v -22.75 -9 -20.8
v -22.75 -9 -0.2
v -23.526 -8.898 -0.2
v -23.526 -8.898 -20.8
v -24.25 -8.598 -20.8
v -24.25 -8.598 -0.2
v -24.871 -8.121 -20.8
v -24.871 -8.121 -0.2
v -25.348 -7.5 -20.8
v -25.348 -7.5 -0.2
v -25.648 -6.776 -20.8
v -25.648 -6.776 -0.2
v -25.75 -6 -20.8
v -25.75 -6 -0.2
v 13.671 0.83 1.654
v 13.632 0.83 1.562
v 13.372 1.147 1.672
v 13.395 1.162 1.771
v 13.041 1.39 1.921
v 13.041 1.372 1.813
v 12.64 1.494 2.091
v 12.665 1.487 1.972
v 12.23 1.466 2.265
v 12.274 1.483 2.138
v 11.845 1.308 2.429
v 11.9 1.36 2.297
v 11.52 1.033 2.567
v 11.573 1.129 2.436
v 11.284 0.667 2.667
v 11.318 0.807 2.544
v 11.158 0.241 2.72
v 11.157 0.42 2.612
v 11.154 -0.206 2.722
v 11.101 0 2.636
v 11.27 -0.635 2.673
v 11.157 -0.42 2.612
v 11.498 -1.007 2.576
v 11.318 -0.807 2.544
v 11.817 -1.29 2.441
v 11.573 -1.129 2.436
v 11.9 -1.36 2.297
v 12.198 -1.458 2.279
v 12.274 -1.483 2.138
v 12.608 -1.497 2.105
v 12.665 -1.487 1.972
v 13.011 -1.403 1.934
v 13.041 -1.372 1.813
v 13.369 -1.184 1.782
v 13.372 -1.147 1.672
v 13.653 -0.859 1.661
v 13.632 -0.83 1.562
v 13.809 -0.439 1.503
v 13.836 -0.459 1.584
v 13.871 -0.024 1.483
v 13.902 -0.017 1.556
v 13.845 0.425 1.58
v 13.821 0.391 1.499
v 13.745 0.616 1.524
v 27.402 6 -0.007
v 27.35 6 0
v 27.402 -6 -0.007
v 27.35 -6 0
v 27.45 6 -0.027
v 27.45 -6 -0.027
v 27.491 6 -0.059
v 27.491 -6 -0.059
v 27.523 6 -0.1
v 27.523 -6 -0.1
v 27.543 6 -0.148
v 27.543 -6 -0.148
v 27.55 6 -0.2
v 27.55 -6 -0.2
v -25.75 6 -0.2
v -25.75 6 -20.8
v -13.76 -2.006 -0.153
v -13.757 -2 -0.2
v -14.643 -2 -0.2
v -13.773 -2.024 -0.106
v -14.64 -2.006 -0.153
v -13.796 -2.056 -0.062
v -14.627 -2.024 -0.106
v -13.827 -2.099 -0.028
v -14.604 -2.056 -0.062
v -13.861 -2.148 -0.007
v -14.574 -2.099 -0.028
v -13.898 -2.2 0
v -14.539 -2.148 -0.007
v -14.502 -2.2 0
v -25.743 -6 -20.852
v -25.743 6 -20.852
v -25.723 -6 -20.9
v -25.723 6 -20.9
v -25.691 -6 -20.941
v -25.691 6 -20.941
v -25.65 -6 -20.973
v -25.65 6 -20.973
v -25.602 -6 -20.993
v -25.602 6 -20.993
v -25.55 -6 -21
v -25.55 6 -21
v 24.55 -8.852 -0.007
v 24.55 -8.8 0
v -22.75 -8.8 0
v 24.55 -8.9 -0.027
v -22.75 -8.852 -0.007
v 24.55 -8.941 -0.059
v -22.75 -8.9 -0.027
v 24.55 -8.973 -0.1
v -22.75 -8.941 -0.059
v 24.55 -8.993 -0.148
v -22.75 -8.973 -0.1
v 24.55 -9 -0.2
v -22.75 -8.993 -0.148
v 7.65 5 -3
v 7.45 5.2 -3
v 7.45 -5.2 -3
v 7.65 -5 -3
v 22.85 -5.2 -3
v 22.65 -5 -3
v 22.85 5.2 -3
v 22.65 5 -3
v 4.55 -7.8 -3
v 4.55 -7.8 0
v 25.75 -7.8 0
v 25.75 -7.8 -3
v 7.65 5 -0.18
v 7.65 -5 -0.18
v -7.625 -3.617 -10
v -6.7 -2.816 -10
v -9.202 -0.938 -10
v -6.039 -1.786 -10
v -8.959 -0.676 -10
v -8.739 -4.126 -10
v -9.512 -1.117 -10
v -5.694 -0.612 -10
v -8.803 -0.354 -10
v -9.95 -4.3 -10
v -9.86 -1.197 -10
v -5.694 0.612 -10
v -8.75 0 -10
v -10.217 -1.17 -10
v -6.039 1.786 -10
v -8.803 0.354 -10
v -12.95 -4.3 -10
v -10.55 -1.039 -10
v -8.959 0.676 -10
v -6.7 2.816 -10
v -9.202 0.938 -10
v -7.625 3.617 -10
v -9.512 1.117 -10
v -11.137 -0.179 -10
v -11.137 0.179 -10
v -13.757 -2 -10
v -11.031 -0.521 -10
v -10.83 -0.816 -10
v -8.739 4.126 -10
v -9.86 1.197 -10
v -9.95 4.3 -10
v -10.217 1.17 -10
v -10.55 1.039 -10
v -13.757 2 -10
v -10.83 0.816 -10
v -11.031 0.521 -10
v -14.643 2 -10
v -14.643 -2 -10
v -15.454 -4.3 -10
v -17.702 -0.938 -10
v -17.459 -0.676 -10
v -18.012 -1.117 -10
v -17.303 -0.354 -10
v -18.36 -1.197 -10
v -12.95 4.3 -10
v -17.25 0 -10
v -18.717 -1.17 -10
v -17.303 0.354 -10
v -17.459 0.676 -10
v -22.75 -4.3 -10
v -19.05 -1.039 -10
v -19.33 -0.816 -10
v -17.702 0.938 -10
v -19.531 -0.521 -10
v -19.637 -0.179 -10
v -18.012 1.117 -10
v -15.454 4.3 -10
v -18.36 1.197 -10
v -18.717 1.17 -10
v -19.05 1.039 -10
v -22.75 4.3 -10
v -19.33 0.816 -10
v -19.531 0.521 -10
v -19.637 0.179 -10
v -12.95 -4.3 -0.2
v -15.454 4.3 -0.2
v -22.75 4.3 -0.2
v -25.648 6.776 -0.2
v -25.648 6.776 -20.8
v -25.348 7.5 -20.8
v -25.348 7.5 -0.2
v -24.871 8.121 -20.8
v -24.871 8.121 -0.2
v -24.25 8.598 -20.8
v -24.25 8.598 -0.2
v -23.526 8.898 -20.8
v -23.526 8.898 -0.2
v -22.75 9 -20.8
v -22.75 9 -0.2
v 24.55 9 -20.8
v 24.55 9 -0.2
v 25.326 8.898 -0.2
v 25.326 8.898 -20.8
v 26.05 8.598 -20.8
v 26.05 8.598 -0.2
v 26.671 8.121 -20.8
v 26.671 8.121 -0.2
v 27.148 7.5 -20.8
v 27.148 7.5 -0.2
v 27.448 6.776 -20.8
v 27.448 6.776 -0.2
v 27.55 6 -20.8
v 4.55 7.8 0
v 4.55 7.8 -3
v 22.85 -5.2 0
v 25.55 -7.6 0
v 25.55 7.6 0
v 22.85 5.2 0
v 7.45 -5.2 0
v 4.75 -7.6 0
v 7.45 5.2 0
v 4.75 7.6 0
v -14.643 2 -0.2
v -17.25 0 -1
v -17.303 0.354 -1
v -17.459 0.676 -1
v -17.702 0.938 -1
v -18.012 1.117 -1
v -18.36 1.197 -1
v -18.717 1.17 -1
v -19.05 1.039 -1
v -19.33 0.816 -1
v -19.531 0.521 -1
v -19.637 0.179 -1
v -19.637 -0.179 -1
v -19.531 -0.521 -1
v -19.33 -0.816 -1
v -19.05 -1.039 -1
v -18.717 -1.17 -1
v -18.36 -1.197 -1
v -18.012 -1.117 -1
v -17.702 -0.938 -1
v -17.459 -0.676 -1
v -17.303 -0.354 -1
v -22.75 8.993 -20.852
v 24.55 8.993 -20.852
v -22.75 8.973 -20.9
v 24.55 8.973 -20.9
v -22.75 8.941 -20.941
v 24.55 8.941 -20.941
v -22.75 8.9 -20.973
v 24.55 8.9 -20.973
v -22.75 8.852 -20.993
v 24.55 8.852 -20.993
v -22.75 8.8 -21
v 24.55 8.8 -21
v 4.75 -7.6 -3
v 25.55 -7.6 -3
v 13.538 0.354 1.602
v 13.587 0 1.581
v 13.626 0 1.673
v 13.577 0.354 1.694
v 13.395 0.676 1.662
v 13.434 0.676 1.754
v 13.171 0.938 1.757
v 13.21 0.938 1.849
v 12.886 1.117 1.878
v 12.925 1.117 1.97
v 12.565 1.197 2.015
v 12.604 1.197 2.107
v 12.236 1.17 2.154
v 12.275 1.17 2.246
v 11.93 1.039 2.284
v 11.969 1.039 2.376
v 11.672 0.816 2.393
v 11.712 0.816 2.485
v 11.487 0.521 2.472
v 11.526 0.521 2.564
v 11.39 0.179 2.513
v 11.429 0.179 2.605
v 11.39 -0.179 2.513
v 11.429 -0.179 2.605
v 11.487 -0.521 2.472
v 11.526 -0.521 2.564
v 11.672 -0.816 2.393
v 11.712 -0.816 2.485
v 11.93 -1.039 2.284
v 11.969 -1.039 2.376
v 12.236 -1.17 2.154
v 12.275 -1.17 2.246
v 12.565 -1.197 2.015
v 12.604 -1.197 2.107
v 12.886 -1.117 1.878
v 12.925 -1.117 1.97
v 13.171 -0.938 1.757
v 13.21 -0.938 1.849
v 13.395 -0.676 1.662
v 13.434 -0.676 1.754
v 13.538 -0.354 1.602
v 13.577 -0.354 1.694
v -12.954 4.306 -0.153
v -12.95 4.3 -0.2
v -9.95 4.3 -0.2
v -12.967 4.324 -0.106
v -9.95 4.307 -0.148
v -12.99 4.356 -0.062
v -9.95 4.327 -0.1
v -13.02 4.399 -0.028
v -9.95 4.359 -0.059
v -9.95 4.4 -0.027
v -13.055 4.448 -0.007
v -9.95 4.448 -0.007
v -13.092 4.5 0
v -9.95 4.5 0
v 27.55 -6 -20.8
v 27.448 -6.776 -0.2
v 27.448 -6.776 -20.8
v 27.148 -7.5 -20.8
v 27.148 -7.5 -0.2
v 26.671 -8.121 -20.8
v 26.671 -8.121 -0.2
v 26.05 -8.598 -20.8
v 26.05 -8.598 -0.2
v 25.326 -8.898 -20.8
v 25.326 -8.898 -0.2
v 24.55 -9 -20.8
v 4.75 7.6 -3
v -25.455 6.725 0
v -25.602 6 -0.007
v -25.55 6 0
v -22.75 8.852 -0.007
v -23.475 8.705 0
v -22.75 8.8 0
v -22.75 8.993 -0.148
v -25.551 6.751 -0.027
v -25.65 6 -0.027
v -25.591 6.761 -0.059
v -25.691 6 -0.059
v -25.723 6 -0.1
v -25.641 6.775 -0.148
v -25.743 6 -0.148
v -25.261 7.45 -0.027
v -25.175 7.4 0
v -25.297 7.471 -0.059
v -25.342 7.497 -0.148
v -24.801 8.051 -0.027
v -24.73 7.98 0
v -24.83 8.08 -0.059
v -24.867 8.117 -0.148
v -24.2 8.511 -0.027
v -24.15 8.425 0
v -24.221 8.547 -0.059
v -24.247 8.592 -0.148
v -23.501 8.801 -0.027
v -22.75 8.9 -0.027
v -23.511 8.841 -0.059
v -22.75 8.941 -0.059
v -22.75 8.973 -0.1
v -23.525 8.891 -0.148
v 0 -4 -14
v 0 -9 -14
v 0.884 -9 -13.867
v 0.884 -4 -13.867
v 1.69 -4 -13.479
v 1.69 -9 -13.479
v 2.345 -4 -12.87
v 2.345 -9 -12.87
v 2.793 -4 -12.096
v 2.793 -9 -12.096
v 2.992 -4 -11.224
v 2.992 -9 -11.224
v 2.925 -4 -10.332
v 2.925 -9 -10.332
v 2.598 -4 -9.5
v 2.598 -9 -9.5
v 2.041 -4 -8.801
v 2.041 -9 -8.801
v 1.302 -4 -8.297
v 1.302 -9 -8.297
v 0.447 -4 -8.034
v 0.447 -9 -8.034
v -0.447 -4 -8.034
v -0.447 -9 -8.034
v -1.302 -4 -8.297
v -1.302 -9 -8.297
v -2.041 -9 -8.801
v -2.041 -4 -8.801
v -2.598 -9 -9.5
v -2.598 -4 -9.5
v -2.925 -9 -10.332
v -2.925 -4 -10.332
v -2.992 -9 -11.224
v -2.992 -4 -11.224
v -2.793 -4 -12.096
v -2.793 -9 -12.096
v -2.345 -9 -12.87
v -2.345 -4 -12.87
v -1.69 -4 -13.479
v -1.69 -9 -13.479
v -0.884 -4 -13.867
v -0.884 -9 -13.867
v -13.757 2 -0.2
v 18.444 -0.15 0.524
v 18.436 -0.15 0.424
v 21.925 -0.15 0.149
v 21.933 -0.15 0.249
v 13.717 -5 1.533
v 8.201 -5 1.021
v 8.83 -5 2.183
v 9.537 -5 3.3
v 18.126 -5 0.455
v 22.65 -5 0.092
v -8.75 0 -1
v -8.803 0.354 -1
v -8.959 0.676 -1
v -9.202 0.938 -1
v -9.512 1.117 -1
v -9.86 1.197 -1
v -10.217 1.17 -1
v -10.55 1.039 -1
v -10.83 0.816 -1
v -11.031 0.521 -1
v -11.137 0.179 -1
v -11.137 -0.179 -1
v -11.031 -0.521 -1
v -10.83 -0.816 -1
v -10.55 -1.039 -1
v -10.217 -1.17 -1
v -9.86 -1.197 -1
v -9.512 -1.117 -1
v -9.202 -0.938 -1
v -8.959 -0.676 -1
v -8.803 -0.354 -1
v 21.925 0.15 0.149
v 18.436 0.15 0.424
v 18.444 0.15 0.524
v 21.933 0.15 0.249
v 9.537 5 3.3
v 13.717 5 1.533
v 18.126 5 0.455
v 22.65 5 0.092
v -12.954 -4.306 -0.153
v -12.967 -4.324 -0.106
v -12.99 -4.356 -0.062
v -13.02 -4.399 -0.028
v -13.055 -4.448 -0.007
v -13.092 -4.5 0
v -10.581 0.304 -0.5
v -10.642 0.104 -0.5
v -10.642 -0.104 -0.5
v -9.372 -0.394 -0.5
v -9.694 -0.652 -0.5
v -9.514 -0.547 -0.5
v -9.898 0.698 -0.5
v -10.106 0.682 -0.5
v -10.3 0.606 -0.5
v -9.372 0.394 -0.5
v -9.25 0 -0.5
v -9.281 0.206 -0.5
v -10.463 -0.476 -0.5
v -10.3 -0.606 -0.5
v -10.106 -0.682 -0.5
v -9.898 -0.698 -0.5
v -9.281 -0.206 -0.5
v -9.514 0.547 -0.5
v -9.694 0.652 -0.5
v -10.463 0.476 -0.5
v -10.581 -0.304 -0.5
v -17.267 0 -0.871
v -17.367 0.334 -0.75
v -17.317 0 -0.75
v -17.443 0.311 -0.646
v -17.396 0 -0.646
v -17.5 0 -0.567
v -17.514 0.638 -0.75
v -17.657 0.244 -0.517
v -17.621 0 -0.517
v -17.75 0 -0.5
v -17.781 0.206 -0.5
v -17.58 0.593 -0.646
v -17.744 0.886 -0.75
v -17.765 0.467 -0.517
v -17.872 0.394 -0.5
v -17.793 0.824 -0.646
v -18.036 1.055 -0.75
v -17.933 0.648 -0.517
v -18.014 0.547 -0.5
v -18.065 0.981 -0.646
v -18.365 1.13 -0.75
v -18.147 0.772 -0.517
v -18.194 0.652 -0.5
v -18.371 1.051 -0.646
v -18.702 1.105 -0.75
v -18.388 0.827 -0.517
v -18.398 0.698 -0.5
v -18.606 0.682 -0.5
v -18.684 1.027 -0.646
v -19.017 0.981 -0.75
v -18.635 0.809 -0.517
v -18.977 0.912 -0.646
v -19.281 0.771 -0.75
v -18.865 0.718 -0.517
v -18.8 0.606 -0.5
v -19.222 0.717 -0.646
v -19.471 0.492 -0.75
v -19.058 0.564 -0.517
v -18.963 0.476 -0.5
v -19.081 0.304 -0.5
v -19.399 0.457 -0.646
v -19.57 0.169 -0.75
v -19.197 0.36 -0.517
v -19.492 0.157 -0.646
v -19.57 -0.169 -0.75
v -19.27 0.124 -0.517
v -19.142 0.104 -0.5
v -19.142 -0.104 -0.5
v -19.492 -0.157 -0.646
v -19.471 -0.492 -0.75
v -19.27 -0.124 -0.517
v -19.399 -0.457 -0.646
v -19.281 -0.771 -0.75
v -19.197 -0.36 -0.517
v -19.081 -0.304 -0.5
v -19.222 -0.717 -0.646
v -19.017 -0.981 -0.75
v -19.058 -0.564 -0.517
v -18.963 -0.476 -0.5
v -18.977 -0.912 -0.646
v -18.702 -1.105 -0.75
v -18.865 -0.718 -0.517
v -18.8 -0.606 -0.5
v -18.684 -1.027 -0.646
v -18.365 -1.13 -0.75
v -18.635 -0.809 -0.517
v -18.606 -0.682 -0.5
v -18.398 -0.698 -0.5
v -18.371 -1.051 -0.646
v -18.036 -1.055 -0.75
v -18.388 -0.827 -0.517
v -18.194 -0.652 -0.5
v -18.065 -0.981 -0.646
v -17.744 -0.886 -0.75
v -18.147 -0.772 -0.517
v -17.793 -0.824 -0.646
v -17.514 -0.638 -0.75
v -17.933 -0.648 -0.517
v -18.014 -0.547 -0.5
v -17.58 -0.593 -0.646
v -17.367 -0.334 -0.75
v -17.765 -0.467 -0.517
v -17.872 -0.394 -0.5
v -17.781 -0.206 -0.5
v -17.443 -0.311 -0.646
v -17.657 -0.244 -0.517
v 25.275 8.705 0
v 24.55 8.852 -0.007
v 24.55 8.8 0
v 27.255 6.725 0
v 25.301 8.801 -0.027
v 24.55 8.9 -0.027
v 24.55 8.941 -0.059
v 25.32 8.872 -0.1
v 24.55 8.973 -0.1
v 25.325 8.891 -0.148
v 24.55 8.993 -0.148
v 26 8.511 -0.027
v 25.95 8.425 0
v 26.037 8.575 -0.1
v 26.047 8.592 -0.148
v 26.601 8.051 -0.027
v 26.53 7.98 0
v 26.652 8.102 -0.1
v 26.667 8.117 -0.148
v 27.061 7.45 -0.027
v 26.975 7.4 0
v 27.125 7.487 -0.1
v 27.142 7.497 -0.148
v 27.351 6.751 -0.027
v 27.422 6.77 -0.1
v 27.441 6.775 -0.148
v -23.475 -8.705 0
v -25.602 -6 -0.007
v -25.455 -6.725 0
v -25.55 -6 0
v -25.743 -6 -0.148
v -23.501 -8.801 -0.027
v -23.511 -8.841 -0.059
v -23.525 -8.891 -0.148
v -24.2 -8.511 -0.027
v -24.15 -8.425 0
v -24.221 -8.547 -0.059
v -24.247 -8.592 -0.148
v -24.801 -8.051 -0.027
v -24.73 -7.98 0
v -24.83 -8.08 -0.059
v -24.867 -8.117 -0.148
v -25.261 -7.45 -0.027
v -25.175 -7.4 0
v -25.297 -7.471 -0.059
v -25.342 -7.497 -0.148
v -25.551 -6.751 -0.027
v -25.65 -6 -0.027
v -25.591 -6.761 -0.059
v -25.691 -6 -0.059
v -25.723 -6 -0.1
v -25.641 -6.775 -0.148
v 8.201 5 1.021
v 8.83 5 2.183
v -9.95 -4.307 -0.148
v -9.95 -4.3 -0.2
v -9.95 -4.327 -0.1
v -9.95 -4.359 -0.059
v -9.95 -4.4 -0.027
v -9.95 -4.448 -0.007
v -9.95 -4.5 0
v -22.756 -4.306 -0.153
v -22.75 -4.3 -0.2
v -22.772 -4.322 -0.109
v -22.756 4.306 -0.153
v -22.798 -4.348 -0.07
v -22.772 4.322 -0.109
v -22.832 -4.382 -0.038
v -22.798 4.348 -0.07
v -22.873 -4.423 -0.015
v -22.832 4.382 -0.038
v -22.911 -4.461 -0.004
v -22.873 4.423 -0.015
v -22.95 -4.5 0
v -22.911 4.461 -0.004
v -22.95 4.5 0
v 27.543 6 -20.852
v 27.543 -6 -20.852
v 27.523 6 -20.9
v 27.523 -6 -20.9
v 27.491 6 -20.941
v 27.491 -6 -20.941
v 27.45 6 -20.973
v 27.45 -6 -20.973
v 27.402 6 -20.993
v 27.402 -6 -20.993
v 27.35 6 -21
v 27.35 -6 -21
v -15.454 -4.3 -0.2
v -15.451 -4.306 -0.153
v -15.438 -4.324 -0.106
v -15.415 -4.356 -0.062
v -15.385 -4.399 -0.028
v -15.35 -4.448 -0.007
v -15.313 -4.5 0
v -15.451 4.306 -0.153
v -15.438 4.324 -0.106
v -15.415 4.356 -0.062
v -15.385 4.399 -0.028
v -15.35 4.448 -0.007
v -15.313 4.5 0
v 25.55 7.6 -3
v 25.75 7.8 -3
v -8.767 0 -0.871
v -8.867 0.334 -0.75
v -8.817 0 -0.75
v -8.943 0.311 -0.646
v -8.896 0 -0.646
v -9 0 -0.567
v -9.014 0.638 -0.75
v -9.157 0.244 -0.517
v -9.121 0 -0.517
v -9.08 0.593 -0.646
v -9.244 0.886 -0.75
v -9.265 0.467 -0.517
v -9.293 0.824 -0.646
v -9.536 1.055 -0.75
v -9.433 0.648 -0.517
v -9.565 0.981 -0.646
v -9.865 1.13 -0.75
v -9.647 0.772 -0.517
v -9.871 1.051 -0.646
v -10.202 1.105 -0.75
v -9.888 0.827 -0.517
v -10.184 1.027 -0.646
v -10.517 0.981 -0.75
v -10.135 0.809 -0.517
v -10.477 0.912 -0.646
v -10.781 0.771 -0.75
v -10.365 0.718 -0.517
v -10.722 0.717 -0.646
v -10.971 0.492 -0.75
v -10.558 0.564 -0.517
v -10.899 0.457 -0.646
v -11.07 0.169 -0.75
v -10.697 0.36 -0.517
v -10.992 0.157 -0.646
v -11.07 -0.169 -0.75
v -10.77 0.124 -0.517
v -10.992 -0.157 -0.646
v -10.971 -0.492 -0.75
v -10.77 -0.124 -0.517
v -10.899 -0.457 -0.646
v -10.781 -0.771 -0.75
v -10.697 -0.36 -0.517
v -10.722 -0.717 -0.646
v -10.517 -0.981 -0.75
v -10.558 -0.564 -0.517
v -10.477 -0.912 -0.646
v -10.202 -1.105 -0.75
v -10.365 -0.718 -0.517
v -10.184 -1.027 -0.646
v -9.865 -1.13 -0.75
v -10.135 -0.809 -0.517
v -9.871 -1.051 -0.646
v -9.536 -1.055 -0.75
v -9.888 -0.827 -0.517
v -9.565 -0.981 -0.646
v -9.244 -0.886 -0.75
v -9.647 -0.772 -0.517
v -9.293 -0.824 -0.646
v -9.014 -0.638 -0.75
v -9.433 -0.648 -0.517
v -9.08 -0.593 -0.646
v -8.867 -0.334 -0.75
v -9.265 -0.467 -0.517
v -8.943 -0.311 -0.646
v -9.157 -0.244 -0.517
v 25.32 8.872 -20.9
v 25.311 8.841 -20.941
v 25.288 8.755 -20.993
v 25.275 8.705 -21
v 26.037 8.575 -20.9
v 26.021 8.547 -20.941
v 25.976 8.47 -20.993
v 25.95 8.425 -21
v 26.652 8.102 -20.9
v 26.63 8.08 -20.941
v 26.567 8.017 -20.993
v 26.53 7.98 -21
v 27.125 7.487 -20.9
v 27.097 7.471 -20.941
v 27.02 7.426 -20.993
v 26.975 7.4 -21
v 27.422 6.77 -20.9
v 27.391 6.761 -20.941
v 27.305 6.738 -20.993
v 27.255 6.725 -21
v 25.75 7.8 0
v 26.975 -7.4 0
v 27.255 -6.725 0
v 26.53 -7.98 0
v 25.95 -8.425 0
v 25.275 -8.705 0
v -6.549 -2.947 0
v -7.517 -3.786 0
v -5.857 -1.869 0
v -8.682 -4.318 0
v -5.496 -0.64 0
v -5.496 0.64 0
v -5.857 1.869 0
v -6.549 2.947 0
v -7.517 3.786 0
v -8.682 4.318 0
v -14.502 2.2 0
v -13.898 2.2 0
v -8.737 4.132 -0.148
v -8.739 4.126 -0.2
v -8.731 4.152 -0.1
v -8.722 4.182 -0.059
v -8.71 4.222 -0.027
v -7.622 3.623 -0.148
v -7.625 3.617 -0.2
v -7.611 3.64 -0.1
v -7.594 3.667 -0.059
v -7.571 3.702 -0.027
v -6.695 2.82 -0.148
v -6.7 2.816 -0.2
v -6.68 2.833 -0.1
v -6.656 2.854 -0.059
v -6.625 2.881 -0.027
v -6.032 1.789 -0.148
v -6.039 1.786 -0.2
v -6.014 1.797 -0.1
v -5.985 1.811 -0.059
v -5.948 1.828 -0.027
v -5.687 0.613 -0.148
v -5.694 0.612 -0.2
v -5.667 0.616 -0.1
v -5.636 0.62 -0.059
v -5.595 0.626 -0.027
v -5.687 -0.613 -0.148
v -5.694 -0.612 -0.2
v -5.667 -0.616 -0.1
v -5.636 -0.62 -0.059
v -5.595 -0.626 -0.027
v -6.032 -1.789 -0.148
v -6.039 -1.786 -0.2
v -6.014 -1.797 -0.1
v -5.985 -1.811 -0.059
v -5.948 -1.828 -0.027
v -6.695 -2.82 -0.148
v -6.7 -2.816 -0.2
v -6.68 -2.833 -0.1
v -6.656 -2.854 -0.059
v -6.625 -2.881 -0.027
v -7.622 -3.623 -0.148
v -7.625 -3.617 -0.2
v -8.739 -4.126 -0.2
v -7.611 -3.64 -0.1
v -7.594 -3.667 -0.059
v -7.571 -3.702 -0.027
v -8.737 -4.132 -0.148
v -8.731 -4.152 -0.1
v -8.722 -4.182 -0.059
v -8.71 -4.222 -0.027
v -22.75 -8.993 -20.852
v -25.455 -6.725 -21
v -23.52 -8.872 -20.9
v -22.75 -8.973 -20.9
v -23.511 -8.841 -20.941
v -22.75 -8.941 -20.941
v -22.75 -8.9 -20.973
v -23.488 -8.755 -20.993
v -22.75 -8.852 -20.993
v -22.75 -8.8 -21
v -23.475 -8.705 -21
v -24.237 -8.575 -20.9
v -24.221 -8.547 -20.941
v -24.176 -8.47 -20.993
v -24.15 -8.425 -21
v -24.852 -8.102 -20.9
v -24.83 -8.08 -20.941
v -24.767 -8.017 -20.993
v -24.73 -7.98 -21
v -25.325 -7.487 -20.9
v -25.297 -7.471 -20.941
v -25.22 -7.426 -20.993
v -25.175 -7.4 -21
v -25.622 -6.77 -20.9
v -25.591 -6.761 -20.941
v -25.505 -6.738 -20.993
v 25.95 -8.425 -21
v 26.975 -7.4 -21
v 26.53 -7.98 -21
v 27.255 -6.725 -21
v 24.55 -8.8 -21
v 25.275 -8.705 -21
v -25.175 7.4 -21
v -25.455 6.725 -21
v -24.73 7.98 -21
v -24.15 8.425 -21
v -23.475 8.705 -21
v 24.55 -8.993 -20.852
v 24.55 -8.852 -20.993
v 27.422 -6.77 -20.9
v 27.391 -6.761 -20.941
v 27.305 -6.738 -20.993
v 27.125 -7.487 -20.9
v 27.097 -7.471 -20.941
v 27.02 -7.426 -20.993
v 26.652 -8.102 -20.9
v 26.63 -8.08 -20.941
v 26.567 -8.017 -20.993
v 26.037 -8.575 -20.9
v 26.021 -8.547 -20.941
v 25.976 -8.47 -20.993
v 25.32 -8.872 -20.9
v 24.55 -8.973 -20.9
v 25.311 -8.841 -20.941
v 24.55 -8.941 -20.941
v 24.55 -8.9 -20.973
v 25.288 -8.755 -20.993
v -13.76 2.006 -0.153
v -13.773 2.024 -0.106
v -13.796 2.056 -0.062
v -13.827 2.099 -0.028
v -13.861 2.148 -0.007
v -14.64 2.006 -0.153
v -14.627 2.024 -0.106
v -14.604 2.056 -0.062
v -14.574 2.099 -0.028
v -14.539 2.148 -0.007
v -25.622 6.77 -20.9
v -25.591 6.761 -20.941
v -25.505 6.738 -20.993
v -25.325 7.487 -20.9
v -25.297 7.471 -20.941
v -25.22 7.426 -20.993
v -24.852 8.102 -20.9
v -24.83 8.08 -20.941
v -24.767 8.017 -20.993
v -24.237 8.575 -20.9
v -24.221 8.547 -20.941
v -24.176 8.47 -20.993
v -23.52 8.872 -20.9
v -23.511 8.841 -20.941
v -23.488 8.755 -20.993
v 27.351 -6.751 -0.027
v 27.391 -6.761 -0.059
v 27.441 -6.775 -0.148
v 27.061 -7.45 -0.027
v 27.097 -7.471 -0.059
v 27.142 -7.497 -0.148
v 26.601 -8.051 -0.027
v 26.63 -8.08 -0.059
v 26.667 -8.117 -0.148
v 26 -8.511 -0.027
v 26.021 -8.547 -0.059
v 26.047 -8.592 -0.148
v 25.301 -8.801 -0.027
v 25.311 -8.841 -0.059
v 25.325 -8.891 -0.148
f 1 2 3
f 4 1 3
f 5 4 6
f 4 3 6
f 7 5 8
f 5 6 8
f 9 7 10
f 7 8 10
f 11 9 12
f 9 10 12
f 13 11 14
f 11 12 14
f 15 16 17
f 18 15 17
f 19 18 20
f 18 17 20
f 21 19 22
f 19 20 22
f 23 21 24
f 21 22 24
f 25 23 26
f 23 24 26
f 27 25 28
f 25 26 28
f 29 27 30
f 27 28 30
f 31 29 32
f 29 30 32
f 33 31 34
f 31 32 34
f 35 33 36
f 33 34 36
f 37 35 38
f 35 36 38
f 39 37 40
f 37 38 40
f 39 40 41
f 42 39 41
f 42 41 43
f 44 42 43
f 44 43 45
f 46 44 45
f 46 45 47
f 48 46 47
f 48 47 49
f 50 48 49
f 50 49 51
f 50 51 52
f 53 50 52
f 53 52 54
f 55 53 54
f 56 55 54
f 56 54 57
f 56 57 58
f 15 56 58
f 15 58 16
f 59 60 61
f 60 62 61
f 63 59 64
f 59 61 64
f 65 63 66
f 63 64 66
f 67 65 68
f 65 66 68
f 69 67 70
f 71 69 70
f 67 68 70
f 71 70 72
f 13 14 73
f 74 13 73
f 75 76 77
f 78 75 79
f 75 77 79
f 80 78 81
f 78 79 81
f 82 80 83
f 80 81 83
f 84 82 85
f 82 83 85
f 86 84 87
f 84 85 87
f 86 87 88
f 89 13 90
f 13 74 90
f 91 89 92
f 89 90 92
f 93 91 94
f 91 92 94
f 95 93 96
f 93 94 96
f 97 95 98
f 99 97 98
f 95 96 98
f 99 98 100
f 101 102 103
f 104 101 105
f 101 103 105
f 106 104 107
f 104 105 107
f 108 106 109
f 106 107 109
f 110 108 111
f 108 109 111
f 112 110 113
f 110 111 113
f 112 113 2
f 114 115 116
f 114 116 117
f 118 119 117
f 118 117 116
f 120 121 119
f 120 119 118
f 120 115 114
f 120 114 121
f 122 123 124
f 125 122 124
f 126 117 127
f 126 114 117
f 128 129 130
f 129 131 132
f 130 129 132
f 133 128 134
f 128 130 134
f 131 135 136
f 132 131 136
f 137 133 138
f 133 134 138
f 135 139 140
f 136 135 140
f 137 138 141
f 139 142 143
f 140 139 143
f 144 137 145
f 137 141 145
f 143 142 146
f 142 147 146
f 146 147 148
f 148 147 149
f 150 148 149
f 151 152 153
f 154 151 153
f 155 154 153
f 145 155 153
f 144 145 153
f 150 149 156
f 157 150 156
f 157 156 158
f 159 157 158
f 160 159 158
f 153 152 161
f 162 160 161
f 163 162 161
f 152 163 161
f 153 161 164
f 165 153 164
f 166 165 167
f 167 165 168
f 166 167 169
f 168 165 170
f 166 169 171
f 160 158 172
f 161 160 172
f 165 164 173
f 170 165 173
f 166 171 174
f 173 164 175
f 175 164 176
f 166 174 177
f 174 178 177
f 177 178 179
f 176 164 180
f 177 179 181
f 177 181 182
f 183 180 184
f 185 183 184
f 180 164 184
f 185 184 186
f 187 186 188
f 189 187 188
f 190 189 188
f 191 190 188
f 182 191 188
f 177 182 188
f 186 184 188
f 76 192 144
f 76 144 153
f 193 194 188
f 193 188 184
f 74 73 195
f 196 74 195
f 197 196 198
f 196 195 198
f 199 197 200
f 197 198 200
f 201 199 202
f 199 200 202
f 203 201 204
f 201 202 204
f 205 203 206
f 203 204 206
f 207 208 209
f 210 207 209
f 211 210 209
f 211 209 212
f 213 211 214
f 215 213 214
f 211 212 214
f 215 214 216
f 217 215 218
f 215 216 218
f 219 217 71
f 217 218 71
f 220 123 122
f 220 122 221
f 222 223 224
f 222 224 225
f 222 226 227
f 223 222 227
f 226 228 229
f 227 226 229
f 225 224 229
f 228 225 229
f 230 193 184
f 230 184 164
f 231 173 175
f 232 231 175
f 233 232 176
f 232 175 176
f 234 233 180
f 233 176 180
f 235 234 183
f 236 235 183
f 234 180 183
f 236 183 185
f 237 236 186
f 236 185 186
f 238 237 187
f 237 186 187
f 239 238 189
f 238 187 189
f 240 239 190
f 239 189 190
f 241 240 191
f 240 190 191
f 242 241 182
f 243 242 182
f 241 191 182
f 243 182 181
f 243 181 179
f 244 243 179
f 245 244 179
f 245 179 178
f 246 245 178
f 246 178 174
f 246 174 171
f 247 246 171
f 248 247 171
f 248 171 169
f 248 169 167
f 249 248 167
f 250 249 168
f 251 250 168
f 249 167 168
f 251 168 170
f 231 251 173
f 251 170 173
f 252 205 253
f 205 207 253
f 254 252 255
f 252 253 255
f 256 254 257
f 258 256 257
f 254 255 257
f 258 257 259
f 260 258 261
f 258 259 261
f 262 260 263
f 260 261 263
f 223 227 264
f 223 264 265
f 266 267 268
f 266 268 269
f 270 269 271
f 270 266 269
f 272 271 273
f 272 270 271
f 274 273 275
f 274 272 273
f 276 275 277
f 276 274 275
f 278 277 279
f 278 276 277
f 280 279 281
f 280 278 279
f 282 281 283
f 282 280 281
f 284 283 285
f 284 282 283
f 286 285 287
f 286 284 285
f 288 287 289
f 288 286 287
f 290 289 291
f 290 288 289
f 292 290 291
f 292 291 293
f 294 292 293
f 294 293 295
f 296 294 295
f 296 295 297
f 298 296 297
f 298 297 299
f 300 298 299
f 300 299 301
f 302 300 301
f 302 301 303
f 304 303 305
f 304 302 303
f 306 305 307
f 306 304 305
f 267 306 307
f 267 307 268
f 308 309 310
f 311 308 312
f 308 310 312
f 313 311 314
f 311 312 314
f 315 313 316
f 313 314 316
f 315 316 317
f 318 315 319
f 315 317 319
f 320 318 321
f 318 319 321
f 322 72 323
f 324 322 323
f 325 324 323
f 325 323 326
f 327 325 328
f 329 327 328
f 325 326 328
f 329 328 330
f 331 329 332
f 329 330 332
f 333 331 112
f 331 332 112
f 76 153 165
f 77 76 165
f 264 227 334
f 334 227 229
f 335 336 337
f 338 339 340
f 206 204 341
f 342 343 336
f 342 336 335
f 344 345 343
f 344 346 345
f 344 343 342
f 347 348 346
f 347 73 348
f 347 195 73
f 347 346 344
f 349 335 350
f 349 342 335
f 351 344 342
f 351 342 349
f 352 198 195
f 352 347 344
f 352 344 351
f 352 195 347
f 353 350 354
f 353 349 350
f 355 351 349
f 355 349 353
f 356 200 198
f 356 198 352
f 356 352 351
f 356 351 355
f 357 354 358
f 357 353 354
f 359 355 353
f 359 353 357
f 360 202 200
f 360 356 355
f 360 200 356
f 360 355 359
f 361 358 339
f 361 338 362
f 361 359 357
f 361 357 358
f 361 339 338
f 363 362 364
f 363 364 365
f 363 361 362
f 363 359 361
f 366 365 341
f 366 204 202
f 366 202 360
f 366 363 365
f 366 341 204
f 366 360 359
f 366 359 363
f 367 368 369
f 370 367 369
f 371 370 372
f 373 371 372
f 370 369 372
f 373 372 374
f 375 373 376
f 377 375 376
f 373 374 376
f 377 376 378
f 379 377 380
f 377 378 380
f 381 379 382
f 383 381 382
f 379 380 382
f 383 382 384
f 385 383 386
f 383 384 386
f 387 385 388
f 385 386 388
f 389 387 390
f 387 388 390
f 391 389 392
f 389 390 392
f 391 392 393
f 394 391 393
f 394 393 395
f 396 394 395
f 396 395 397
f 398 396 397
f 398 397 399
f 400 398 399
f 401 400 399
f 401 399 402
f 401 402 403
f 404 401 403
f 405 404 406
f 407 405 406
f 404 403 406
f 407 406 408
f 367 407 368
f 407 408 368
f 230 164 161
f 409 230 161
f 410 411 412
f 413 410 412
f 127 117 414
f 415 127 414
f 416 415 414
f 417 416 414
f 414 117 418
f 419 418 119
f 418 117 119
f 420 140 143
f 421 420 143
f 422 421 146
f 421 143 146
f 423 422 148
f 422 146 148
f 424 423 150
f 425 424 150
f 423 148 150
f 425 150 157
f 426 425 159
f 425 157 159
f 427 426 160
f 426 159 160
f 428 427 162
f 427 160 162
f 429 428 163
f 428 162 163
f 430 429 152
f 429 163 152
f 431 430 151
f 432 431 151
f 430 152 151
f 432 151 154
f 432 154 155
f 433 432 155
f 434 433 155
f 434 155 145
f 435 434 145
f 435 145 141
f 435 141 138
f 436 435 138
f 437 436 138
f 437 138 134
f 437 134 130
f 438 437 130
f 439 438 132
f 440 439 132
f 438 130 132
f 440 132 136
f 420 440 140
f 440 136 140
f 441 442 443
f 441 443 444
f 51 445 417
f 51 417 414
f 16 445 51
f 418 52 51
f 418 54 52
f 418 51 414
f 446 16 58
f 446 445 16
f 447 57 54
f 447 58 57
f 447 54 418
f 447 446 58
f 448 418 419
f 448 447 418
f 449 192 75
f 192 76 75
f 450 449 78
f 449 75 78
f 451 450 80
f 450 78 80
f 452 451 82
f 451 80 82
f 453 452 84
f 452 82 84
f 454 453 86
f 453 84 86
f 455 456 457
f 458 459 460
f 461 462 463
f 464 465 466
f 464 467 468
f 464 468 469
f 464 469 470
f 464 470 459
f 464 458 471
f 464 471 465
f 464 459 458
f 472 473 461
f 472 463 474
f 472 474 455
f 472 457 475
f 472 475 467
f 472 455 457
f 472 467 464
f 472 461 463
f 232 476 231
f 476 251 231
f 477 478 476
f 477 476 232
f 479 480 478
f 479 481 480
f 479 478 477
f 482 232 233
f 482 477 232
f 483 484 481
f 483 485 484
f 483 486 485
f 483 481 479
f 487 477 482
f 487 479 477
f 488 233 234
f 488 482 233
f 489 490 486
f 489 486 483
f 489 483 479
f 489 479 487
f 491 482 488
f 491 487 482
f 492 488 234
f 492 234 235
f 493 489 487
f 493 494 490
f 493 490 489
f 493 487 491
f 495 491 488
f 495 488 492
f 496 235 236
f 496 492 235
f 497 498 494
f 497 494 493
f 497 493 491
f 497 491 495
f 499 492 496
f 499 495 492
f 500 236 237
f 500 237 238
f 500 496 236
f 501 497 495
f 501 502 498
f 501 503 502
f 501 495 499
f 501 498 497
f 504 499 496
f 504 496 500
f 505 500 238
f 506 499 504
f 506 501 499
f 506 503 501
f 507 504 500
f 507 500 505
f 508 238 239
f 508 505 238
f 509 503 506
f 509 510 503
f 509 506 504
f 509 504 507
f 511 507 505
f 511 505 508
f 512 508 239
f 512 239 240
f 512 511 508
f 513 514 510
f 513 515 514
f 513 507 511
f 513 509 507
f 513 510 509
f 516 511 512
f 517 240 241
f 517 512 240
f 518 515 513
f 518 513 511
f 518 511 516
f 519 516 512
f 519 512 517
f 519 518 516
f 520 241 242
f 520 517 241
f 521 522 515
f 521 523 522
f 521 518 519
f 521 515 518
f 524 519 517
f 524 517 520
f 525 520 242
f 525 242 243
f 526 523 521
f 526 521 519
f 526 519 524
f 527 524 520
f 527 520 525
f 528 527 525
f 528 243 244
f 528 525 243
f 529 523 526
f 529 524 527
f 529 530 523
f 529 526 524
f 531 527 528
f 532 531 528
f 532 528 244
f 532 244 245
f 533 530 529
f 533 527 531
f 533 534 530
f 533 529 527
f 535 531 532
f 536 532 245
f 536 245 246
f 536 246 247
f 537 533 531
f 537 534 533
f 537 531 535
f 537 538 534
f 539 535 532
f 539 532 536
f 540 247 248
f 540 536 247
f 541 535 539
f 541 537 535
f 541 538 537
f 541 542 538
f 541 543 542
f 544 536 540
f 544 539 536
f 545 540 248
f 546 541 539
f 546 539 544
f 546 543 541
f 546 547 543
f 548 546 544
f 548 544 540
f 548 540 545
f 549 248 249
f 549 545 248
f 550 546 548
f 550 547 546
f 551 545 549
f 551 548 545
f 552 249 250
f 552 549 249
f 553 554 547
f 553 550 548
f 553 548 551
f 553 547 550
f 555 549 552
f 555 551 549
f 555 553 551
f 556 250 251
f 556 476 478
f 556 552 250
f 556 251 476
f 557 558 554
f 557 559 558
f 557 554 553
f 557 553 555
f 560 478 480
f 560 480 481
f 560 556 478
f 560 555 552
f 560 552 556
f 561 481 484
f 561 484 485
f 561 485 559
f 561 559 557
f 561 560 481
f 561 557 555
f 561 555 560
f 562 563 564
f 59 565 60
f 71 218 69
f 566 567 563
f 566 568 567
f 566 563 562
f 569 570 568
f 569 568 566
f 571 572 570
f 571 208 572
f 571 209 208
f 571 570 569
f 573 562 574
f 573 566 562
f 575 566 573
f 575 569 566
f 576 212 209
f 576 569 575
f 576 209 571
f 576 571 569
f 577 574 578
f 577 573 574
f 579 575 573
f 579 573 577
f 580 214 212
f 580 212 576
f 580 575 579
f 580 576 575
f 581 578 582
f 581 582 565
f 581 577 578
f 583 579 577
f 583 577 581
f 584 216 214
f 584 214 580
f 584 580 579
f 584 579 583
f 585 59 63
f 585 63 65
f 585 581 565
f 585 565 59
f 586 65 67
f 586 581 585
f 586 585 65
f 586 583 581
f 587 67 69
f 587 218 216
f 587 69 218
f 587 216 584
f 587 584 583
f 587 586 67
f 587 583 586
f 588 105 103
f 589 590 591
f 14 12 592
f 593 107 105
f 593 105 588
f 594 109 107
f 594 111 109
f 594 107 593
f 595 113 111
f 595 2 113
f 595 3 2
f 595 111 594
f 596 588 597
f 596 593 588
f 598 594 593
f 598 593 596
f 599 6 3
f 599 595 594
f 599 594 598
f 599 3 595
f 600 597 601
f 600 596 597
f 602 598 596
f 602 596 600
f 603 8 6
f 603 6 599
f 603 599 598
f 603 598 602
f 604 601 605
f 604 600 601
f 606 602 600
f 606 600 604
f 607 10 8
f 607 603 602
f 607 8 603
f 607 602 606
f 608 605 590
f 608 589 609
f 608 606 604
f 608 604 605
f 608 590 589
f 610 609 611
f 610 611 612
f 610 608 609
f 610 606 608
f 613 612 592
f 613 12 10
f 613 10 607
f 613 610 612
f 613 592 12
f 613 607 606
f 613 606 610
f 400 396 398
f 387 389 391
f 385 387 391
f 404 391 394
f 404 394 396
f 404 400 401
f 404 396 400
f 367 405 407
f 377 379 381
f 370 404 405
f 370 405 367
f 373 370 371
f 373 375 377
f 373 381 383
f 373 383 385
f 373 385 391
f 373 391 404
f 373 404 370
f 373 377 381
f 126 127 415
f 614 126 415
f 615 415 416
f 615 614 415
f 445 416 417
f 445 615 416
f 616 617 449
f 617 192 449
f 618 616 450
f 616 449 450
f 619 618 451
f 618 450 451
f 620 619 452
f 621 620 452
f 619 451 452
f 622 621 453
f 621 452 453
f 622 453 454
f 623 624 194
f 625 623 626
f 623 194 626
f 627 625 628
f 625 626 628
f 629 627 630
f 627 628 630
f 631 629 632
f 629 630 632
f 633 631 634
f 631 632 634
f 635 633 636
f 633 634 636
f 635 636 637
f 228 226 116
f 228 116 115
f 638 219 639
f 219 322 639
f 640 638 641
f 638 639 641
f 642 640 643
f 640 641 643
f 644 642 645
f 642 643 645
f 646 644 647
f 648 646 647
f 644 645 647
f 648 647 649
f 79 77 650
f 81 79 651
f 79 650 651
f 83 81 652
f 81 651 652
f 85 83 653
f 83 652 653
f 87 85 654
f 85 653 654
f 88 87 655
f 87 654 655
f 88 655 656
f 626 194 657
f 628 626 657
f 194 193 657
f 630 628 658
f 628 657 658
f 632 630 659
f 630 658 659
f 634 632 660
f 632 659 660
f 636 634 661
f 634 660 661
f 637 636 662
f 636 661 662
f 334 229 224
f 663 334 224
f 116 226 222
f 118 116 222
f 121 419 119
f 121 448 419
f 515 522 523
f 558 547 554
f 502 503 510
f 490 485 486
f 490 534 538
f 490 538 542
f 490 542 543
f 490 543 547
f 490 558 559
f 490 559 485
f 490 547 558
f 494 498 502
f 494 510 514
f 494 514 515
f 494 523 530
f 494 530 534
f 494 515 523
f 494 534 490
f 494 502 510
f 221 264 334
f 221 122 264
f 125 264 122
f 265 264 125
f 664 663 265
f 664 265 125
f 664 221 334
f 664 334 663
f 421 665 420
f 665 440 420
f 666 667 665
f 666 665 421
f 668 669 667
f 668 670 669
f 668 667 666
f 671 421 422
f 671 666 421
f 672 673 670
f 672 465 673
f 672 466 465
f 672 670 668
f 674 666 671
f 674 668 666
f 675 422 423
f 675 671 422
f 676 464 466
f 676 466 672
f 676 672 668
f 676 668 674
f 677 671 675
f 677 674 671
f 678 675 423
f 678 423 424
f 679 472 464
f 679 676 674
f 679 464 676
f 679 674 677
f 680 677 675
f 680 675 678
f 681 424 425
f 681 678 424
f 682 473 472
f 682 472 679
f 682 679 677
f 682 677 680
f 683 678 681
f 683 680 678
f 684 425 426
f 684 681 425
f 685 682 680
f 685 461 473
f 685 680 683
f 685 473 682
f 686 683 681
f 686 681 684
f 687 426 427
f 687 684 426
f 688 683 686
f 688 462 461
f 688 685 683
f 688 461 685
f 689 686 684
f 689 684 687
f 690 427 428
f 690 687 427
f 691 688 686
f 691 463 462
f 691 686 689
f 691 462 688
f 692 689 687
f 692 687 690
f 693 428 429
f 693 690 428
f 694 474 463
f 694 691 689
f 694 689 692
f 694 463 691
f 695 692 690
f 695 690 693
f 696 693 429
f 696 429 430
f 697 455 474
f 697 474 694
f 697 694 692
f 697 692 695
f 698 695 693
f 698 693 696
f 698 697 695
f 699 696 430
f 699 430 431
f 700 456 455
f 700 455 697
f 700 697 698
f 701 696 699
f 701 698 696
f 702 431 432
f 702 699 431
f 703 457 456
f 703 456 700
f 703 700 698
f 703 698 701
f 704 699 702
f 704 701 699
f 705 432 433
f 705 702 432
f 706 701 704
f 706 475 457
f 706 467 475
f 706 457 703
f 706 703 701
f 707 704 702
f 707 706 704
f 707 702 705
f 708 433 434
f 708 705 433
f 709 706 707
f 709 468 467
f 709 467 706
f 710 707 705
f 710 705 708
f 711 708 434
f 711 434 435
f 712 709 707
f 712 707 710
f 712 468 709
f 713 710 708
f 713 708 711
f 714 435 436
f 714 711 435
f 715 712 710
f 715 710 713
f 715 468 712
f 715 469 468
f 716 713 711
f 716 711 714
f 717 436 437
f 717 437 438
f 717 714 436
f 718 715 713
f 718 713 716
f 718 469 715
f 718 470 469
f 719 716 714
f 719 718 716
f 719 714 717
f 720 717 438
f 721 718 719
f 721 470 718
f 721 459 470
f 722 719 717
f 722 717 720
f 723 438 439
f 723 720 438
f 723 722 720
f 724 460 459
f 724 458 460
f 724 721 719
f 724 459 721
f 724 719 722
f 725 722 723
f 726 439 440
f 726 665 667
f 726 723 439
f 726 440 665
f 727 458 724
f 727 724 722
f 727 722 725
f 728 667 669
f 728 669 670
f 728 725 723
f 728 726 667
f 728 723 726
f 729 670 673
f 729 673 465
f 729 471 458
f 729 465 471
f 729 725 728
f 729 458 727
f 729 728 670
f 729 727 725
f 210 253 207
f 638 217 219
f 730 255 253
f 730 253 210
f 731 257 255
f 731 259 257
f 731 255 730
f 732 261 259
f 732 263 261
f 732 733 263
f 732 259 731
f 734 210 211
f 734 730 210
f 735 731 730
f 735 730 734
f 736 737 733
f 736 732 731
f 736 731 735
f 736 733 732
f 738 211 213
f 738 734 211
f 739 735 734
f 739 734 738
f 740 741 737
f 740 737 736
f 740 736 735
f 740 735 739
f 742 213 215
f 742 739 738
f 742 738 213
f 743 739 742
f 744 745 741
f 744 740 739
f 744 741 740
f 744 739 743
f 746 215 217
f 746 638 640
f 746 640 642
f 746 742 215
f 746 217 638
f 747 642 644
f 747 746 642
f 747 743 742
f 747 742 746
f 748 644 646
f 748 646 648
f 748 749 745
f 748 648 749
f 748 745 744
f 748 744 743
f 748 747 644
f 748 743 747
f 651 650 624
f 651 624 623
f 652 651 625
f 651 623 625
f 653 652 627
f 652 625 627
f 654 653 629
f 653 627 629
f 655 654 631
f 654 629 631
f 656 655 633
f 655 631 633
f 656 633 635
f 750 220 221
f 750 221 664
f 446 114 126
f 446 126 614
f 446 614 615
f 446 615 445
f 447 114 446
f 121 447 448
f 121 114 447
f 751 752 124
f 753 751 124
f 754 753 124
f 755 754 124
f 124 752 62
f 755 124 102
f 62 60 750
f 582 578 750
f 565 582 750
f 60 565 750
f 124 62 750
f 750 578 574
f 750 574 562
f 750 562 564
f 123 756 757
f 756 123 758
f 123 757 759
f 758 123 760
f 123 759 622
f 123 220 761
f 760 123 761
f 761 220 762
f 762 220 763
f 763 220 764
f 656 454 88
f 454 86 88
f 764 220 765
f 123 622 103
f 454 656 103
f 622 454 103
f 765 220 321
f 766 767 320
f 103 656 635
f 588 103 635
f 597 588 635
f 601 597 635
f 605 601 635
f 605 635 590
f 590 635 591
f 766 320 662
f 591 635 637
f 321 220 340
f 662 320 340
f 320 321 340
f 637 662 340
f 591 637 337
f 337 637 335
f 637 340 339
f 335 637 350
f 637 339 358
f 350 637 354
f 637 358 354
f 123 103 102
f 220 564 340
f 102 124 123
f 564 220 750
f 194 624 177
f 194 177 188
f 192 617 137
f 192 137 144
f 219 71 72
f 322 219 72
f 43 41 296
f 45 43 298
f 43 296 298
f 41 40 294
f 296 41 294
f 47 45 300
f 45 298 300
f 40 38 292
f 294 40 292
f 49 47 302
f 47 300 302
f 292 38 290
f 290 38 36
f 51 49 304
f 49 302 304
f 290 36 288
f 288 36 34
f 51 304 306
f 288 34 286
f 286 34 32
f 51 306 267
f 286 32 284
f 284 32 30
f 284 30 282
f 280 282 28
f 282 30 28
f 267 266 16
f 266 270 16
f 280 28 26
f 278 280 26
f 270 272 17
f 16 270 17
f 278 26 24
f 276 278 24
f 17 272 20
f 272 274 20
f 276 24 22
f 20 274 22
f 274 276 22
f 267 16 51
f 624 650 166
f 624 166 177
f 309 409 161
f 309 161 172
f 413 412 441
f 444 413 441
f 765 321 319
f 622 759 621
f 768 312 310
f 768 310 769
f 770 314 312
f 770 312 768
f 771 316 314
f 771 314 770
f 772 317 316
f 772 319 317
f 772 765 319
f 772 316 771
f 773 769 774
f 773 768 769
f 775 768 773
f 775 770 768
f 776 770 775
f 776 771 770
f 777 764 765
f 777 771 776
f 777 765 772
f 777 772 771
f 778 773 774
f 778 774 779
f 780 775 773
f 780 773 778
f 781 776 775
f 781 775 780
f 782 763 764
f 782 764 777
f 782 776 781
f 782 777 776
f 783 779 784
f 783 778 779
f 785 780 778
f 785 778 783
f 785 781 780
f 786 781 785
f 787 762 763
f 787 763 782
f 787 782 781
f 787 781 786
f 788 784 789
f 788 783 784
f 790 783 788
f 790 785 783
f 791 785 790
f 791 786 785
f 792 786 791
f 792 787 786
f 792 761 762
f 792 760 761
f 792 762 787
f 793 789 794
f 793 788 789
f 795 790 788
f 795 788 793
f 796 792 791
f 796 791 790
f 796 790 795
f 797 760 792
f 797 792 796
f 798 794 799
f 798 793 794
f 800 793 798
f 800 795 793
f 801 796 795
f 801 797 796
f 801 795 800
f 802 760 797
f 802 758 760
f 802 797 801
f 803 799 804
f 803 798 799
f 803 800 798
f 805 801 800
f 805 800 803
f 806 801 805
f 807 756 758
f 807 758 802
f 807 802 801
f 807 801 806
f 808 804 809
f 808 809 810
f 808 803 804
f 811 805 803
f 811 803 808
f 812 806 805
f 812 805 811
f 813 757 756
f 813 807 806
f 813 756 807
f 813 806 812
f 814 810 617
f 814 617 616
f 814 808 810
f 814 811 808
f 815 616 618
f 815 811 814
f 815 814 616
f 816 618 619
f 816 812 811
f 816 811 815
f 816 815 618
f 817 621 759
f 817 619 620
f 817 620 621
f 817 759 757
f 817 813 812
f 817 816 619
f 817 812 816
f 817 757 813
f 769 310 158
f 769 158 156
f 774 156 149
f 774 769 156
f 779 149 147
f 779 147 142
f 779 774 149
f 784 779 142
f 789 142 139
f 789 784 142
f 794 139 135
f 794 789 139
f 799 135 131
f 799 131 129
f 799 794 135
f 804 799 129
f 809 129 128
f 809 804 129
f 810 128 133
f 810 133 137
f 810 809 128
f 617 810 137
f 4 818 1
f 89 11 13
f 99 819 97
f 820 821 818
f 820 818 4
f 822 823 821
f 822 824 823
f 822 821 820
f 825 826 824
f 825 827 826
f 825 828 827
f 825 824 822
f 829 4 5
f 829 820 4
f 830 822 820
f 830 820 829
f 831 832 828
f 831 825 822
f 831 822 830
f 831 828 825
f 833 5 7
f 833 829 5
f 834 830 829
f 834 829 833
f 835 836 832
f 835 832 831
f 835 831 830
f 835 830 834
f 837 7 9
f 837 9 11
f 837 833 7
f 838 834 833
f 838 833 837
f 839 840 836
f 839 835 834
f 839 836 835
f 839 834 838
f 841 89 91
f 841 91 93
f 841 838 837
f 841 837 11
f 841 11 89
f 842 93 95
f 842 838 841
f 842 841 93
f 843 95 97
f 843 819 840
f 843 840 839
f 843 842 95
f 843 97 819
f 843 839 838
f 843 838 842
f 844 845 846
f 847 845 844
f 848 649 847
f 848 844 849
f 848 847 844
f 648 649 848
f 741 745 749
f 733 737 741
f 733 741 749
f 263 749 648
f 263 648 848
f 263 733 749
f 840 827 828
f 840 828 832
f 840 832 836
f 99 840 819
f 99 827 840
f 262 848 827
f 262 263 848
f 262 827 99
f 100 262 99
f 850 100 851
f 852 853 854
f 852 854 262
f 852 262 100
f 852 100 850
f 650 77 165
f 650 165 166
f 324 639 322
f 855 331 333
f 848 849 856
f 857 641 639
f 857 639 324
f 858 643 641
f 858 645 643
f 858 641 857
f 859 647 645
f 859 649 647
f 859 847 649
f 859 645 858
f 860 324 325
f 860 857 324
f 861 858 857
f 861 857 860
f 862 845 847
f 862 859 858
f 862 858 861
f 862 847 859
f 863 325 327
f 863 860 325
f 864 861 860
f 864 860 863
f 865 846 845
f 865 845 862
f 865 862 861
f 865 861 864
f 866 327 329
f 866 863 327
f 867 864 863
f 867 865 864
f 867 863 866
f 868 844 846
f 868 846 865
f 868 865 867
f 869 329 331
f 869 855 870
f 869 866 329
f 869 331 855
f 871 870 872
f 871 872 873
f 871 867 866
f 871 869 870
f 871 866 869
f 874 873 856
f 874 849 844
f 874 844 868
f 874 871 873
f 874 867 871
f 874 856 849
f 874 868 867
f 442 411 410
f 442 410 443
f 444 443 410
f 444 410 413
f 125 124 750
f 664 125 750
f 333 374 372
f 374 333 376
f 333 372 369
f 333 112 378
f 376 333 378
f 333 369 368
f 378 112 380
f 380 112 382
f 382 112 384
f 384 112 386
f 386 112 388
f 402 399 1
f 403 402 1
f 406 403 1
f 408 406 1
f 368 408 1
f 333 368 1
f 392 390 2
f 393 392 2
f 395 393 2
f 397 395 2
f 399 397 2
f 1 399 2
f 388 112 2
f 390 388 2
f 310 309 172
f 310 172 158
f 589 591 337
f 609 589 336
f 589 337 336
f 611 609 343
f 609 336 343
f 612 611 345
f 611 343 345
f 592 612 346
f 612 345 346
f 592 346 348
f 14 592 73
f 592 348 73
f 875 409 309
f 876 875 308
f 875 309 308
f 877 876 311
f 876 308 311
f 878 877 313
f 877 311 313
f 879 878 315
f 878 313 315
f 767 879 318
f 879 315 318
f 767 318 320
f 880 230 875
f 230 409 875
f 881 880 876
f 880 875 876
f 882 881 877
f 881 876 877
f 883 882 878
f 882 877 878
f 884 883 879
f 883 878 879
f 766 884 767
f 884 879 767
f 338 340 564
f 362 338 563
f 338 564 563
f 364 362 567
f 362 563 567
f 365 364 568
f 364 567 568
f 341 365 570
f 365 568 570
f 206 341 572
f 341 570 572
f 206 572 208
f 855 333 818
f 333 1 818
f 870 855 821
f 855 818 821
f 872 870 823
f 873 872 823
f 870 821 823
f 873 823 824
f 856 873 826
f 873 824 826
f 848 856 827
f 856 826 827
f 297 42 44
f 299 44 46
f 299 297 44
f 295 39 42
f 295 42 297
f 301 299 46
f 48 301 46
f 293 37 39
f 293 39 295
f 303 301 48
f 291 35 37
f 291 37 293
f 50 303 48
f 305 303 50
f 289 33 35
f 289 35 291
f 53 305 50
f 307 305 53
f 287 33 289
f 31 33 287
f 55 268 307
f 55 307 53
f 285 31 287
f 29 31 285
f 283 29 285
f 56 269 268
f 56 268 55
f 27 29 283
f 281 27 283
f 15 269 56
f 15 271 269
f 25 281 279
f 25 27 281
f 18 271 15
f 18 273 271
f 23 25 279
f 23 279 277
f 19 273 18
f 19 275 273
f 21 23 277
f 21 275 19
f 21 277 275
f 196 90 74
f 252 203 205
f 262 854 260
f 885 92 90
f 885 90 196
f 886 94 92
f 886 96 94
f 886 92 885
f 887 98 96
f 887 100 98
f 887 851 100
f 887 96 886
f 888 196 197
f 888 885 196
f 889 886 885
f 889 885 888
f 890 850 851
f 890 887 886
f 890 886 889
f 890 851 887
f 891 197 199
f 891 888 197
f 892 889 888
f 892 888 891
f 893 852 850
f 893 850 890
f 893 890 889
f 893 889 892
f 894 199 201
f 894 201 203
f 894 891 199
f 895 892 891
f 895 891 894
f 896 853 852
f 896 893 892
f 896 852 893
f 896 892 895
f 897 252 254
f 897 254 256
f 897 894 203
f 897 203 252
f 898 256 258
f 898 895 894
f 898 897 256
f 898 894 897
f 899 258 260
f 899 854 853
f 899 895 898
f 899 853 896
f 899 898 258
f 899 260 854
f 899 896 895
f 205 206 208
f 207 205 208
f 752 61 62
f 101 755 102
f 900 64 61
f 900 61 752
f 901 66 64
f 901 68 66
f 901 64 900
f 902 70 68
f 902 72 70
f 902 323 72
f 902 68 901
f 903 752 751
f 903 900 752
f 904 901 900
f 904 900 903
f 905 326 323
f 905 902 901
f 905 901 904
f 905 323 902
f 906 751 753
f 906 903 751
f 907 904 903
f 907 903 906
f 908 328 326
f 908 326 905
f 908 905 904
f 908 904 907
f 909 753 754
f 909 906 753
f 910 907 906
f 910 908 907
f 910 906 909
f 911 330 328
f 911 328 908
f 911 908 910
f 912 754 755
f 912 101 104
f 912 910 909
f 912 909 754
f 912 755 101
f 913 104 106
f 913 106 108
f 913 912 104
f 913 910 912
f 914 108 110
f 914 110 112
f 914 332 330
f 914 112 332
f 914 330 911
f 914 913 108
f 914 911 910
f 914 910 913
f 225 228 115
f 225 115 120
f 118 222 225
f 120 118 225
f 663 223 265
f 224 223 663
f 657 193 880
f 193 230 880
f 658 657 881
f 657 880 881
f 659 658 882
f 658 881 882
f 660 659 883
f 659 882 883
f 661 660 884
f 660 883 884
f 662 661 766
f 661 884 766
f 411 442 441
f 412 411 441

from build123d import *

# Parameters (mm, degrees)
EXTRUSION1_DEPTH        = 21
ENL_V_MAT_EXTRU_1_DEPTH = 10
ESQUISSE3_R             = 1.2
EXTRUSION2_DEPTH        = 9.5
CONG_1_R                = 0.5
CONG_2_R                = 0.2
ESQUISSE5_W             = 21.2
ESQUISSE5_H             = 15.6
ESQUISSE5_W_2           = 20.8
ESQUISSE5_H_2           = 15.2
ENL_V_MAT_EXTRU_2_DEPTH = 3
ESQUISSE6_W             = 15.4
ESQUISSE6_H             = 10.4
ENL_V_MAT_EXTRU_3_DEPTH = 3
EXTRUSION3_DEPTH        = 5
ESQUISSE8_R             = 1.5
ESQUISSE8_R_2           = 1.2
EXTRUSION4_DEPTH        = 0.1
ESQUISSE9_W             = 3.5
ESQUISSE9_H             = 0.3
EXTRUSION5_DEPTH        = 0.1
ESQUISSE10_R            = 3
ENL_V_MAT_EXTRU_4_DEPTH = 5
CONG_3_R                = 0.2
CONG_4_R                = 0.2


with BuildPart() as part:
    # Esquisse1 → Extrusion1 (new body)
    with BuildSketch(Plane.XY):
        with BuildLine():
            Line((-22.75, 9), (24.55, 9))
            ThreePointArc((24.55, 9), (26.671320344, 8.121320344), (27.55, 6))
            Line((27.55, 6), (27.55, -6))
            ThreePointArc((27.55, -6), (26.671320344, -8.121320344), (24.55, -9))
            Line((24.55, -9), (-22.75, -9))
            ThreePointArc((-22.75, -9), (-24.871320344, -8.121320344), (-25.75, -6))
            Line((-25.75, -6), (-25.75, 6))
            ThreePointArc((-25.75, 6), (-24.871320344, 8.121320344), (-22.75, 9))
        make_face()
    extrude(amount=-EXTRUSION1_DEPTH)

    # Esquisse2 → Enlèv. mat.-Extru.1 (cut)
    with BuildSketch(Plane.XY):
        with BuildLine():
            Line((-22.75, 4.3), (-15.454474502, 4.3))
            Line((-15.454474502, 4.3), (-14.643426738, 2))
            Line((-14.643426738, 2), (-13.756573262, 2))
            Line((-13.756573262, 2), (-12.95, 4.3))
            Line((-12.95, 4.3), (-9.95, 4.3))
            ThreePointArc((-9.95, 4.3), (-5.65, 0), (-9.95, -4.3))
            Line((-9.95, -4.3), (-12.95, -4.3))
            Line((-12.95, -4.3), (-13.756573262, -2))
            Line((-13.756573262, -2), (-14.643426738, -2))
            Line((-14.643426738, -2), (-15.454474502, -4.3))
            Line((-15.454474502, -4.3), (-22.75, -4.3))
            Line((-22.75, -4.3), (-22.75, 4.3))
        make_face()
    extrude(amount=-ENL_V_MAT_EXTRU_1_DEPTH, mode=Mode.SUBTRACT)

    # Esquisse3 → Extrusion2 (add)
    with BuildSketch(Plane.XY.offset(-10)):
        with Locations((-9.95, 0)):
            Circle(ESQUISSE3_R)
        with Locations((-18.45, 0)):
            Circle(ESQUISSE3_R)
    extrude(amount=EXTRUSION2_DEPTH)

    # Congé1
    cong_1_edges = [part.edges().sort_by_distance(p)[0] for p in [
        (-11.15, 0, -0.5),
        (-19.65, 0, -0.5),
    ]]
    fillet(cong_1_edges, radius=CONG_1_R)

    # Congé2
    cong_2_edges = [part.edges().sort_by_distance(p)[0] for p in [
        (-22.75, 0, 0),
        (-19.102237251, -4.3, 0),
        (-15.04895062, -3.15, 0),
        (-14.2, -2, 0),
        (-13.353286631, -3.15, 0),
        (-11.45, -4.3, 0),
        (-5.65, 0, 0),
        (-11.45, 4.3, 0),
        (-13.353286631, 3.15, 0),
        (-14.2, 2, 0),
        (-15.04895062, 3.15, 0),
        (-19.102237251, 4.3, 0),
    ]]
    fillet(cong_2_edges, radius=CONG_2_R)

    # Esquisse5 → Enlèv. mat.-Extru.2 (cut)
    with BuildSketch(Plane.XY):
        with Locations((15.15, 0)):
            Rectangle(ESQUISSE5_W, ESQUISSE5_H)
        with Locations((15.15, 0)):
            Rectangle(ESQUISSE5_W_2, ESQUISSE5_H_2, mode=Mode.SUBTRACT)
    extrude(amount=-ENL_V_MAT_EXTRU_2_DEPTH, mode=Mode.SUBTRACT)

    # Esquisse6 → Enlèv. mat.-Extru.3 (cut)
    with BuildSketch(Plane.XY):
        with Locations((15.15, 0)):
            Rectangle(ESQUISSE6_W, ESQUISSE6_H)
    extrude(amount=-ENL_V_MAT_EXTRU_3_DEPTH, mode=Mode.SUBTRACT)

    # Esquisse7 → Extrusion3 (add, symmetric)
    with BuildSketch(Plane(origin=(0, 0, 0), x_dir=(1, 0, 0), z_dir=(0, 1, 0))):
        with BuildLine():
            Line((7.65, 3), (7.65, 0.179778052))
            ThreePointArc((7.65, 0.179778052), (8.505861002, -1.607503561), (9.536554661, -3.3))
            ThreePointArc((9.536554661, -3.3), (15.899956373, -0.905809313), (22.65, -0.092211479))
            Line((22.65, -0.092211479), (22.65, 3))
            Line((22.65, 3), (7.65, 3))
        make_face()
    extrude(amount=EXTRUSION3_DEPTH, both=True)

    # Esquisse8 → Extrusion4 (add)
    with BuildSketch(Plane(origin=(2.642864241, 0, 6.226197974), x_dir=(0.9205048534524413, 0, -0.39073112848927166), z_dir=(0.39073112848927166, 0, 0.9205048534524413))):
        with Locations(Location((10.689032127, 0, 0), (0, 0, 33.617291892))):
            Circle(ESQUISSE8_R)
        with Locations((10.689032127, 0)):
            Circle(ESQUISSE8_R_2, mode=Mode.SUBTRACT)
    extrude(amount=EXTRUSION4_DEPTH)

    # Esquisse10 → Enlèv. mat.-Extru.4 (cut)
    with BuildSketch(Plane.XZ.offset(9)):
        with Locations(Location((0, -11, 0), (0, 0, 270))):
            Circle(ESQUISSE10_R)
    extrude(amount=-ENL_V_MAT_EXTRU_4_DEPTH, mode=Mode.SUBTRACT)

    # Congé3
    cong_3_edges = [part.edges().sort_by_distance(p)[0] for p in [
        (27.55, 0, 0),
        (26.671320344, -8.121320344, 0),
        (0.9, -9, 0),
        (-24.871320344, -8.121320344, 0),
        (-25.75, 0, 0),
        (-24.871320344, 8.121320344, 0),
        (0.9, 9, 0),
        (26.671320344, 8.121320344, 0),
    ]]
    fillet(cong_3_edges, radius=CONG_3_R)

    # Congé4
    cong_4_edges = [part.edges().sort_by_distance(p)[0] for p in [
        (26.671320344, 8.121320344, -21),
        (0.9, 9, -21),
        (-24.871320344, 8.121320344, -21),
        (-25.75, 0, -21),
        (-24.871320344, -8.121320344, -21),
        (0.9, -9, -21),
        (26.671320344, -8.121320344, -21),
        (27.55, 0, -21),
    ]]
    fillet(cong_4_edges, radius=CONG_4_R)


with BuildPart() as body_2:
    # Esquisse9 → Extrusion5 (new body)
    with BuildSketch(Plane(origin=(0.146642069, 0, 1.863264158), x_dir=(0.9969173337331282, 0, -0.07845909572784168), z_dir=(0.07845909572784168, 0, 0.9969173337331282))):
        with Locations((20.095779555, 0)):
            Rectangle(ESQUISSE9_W, ESQUISSE9_H)
    extrude(amount=EXTRUSION5_DEPTH)


solid = Compound([part.part, body_2.part])
